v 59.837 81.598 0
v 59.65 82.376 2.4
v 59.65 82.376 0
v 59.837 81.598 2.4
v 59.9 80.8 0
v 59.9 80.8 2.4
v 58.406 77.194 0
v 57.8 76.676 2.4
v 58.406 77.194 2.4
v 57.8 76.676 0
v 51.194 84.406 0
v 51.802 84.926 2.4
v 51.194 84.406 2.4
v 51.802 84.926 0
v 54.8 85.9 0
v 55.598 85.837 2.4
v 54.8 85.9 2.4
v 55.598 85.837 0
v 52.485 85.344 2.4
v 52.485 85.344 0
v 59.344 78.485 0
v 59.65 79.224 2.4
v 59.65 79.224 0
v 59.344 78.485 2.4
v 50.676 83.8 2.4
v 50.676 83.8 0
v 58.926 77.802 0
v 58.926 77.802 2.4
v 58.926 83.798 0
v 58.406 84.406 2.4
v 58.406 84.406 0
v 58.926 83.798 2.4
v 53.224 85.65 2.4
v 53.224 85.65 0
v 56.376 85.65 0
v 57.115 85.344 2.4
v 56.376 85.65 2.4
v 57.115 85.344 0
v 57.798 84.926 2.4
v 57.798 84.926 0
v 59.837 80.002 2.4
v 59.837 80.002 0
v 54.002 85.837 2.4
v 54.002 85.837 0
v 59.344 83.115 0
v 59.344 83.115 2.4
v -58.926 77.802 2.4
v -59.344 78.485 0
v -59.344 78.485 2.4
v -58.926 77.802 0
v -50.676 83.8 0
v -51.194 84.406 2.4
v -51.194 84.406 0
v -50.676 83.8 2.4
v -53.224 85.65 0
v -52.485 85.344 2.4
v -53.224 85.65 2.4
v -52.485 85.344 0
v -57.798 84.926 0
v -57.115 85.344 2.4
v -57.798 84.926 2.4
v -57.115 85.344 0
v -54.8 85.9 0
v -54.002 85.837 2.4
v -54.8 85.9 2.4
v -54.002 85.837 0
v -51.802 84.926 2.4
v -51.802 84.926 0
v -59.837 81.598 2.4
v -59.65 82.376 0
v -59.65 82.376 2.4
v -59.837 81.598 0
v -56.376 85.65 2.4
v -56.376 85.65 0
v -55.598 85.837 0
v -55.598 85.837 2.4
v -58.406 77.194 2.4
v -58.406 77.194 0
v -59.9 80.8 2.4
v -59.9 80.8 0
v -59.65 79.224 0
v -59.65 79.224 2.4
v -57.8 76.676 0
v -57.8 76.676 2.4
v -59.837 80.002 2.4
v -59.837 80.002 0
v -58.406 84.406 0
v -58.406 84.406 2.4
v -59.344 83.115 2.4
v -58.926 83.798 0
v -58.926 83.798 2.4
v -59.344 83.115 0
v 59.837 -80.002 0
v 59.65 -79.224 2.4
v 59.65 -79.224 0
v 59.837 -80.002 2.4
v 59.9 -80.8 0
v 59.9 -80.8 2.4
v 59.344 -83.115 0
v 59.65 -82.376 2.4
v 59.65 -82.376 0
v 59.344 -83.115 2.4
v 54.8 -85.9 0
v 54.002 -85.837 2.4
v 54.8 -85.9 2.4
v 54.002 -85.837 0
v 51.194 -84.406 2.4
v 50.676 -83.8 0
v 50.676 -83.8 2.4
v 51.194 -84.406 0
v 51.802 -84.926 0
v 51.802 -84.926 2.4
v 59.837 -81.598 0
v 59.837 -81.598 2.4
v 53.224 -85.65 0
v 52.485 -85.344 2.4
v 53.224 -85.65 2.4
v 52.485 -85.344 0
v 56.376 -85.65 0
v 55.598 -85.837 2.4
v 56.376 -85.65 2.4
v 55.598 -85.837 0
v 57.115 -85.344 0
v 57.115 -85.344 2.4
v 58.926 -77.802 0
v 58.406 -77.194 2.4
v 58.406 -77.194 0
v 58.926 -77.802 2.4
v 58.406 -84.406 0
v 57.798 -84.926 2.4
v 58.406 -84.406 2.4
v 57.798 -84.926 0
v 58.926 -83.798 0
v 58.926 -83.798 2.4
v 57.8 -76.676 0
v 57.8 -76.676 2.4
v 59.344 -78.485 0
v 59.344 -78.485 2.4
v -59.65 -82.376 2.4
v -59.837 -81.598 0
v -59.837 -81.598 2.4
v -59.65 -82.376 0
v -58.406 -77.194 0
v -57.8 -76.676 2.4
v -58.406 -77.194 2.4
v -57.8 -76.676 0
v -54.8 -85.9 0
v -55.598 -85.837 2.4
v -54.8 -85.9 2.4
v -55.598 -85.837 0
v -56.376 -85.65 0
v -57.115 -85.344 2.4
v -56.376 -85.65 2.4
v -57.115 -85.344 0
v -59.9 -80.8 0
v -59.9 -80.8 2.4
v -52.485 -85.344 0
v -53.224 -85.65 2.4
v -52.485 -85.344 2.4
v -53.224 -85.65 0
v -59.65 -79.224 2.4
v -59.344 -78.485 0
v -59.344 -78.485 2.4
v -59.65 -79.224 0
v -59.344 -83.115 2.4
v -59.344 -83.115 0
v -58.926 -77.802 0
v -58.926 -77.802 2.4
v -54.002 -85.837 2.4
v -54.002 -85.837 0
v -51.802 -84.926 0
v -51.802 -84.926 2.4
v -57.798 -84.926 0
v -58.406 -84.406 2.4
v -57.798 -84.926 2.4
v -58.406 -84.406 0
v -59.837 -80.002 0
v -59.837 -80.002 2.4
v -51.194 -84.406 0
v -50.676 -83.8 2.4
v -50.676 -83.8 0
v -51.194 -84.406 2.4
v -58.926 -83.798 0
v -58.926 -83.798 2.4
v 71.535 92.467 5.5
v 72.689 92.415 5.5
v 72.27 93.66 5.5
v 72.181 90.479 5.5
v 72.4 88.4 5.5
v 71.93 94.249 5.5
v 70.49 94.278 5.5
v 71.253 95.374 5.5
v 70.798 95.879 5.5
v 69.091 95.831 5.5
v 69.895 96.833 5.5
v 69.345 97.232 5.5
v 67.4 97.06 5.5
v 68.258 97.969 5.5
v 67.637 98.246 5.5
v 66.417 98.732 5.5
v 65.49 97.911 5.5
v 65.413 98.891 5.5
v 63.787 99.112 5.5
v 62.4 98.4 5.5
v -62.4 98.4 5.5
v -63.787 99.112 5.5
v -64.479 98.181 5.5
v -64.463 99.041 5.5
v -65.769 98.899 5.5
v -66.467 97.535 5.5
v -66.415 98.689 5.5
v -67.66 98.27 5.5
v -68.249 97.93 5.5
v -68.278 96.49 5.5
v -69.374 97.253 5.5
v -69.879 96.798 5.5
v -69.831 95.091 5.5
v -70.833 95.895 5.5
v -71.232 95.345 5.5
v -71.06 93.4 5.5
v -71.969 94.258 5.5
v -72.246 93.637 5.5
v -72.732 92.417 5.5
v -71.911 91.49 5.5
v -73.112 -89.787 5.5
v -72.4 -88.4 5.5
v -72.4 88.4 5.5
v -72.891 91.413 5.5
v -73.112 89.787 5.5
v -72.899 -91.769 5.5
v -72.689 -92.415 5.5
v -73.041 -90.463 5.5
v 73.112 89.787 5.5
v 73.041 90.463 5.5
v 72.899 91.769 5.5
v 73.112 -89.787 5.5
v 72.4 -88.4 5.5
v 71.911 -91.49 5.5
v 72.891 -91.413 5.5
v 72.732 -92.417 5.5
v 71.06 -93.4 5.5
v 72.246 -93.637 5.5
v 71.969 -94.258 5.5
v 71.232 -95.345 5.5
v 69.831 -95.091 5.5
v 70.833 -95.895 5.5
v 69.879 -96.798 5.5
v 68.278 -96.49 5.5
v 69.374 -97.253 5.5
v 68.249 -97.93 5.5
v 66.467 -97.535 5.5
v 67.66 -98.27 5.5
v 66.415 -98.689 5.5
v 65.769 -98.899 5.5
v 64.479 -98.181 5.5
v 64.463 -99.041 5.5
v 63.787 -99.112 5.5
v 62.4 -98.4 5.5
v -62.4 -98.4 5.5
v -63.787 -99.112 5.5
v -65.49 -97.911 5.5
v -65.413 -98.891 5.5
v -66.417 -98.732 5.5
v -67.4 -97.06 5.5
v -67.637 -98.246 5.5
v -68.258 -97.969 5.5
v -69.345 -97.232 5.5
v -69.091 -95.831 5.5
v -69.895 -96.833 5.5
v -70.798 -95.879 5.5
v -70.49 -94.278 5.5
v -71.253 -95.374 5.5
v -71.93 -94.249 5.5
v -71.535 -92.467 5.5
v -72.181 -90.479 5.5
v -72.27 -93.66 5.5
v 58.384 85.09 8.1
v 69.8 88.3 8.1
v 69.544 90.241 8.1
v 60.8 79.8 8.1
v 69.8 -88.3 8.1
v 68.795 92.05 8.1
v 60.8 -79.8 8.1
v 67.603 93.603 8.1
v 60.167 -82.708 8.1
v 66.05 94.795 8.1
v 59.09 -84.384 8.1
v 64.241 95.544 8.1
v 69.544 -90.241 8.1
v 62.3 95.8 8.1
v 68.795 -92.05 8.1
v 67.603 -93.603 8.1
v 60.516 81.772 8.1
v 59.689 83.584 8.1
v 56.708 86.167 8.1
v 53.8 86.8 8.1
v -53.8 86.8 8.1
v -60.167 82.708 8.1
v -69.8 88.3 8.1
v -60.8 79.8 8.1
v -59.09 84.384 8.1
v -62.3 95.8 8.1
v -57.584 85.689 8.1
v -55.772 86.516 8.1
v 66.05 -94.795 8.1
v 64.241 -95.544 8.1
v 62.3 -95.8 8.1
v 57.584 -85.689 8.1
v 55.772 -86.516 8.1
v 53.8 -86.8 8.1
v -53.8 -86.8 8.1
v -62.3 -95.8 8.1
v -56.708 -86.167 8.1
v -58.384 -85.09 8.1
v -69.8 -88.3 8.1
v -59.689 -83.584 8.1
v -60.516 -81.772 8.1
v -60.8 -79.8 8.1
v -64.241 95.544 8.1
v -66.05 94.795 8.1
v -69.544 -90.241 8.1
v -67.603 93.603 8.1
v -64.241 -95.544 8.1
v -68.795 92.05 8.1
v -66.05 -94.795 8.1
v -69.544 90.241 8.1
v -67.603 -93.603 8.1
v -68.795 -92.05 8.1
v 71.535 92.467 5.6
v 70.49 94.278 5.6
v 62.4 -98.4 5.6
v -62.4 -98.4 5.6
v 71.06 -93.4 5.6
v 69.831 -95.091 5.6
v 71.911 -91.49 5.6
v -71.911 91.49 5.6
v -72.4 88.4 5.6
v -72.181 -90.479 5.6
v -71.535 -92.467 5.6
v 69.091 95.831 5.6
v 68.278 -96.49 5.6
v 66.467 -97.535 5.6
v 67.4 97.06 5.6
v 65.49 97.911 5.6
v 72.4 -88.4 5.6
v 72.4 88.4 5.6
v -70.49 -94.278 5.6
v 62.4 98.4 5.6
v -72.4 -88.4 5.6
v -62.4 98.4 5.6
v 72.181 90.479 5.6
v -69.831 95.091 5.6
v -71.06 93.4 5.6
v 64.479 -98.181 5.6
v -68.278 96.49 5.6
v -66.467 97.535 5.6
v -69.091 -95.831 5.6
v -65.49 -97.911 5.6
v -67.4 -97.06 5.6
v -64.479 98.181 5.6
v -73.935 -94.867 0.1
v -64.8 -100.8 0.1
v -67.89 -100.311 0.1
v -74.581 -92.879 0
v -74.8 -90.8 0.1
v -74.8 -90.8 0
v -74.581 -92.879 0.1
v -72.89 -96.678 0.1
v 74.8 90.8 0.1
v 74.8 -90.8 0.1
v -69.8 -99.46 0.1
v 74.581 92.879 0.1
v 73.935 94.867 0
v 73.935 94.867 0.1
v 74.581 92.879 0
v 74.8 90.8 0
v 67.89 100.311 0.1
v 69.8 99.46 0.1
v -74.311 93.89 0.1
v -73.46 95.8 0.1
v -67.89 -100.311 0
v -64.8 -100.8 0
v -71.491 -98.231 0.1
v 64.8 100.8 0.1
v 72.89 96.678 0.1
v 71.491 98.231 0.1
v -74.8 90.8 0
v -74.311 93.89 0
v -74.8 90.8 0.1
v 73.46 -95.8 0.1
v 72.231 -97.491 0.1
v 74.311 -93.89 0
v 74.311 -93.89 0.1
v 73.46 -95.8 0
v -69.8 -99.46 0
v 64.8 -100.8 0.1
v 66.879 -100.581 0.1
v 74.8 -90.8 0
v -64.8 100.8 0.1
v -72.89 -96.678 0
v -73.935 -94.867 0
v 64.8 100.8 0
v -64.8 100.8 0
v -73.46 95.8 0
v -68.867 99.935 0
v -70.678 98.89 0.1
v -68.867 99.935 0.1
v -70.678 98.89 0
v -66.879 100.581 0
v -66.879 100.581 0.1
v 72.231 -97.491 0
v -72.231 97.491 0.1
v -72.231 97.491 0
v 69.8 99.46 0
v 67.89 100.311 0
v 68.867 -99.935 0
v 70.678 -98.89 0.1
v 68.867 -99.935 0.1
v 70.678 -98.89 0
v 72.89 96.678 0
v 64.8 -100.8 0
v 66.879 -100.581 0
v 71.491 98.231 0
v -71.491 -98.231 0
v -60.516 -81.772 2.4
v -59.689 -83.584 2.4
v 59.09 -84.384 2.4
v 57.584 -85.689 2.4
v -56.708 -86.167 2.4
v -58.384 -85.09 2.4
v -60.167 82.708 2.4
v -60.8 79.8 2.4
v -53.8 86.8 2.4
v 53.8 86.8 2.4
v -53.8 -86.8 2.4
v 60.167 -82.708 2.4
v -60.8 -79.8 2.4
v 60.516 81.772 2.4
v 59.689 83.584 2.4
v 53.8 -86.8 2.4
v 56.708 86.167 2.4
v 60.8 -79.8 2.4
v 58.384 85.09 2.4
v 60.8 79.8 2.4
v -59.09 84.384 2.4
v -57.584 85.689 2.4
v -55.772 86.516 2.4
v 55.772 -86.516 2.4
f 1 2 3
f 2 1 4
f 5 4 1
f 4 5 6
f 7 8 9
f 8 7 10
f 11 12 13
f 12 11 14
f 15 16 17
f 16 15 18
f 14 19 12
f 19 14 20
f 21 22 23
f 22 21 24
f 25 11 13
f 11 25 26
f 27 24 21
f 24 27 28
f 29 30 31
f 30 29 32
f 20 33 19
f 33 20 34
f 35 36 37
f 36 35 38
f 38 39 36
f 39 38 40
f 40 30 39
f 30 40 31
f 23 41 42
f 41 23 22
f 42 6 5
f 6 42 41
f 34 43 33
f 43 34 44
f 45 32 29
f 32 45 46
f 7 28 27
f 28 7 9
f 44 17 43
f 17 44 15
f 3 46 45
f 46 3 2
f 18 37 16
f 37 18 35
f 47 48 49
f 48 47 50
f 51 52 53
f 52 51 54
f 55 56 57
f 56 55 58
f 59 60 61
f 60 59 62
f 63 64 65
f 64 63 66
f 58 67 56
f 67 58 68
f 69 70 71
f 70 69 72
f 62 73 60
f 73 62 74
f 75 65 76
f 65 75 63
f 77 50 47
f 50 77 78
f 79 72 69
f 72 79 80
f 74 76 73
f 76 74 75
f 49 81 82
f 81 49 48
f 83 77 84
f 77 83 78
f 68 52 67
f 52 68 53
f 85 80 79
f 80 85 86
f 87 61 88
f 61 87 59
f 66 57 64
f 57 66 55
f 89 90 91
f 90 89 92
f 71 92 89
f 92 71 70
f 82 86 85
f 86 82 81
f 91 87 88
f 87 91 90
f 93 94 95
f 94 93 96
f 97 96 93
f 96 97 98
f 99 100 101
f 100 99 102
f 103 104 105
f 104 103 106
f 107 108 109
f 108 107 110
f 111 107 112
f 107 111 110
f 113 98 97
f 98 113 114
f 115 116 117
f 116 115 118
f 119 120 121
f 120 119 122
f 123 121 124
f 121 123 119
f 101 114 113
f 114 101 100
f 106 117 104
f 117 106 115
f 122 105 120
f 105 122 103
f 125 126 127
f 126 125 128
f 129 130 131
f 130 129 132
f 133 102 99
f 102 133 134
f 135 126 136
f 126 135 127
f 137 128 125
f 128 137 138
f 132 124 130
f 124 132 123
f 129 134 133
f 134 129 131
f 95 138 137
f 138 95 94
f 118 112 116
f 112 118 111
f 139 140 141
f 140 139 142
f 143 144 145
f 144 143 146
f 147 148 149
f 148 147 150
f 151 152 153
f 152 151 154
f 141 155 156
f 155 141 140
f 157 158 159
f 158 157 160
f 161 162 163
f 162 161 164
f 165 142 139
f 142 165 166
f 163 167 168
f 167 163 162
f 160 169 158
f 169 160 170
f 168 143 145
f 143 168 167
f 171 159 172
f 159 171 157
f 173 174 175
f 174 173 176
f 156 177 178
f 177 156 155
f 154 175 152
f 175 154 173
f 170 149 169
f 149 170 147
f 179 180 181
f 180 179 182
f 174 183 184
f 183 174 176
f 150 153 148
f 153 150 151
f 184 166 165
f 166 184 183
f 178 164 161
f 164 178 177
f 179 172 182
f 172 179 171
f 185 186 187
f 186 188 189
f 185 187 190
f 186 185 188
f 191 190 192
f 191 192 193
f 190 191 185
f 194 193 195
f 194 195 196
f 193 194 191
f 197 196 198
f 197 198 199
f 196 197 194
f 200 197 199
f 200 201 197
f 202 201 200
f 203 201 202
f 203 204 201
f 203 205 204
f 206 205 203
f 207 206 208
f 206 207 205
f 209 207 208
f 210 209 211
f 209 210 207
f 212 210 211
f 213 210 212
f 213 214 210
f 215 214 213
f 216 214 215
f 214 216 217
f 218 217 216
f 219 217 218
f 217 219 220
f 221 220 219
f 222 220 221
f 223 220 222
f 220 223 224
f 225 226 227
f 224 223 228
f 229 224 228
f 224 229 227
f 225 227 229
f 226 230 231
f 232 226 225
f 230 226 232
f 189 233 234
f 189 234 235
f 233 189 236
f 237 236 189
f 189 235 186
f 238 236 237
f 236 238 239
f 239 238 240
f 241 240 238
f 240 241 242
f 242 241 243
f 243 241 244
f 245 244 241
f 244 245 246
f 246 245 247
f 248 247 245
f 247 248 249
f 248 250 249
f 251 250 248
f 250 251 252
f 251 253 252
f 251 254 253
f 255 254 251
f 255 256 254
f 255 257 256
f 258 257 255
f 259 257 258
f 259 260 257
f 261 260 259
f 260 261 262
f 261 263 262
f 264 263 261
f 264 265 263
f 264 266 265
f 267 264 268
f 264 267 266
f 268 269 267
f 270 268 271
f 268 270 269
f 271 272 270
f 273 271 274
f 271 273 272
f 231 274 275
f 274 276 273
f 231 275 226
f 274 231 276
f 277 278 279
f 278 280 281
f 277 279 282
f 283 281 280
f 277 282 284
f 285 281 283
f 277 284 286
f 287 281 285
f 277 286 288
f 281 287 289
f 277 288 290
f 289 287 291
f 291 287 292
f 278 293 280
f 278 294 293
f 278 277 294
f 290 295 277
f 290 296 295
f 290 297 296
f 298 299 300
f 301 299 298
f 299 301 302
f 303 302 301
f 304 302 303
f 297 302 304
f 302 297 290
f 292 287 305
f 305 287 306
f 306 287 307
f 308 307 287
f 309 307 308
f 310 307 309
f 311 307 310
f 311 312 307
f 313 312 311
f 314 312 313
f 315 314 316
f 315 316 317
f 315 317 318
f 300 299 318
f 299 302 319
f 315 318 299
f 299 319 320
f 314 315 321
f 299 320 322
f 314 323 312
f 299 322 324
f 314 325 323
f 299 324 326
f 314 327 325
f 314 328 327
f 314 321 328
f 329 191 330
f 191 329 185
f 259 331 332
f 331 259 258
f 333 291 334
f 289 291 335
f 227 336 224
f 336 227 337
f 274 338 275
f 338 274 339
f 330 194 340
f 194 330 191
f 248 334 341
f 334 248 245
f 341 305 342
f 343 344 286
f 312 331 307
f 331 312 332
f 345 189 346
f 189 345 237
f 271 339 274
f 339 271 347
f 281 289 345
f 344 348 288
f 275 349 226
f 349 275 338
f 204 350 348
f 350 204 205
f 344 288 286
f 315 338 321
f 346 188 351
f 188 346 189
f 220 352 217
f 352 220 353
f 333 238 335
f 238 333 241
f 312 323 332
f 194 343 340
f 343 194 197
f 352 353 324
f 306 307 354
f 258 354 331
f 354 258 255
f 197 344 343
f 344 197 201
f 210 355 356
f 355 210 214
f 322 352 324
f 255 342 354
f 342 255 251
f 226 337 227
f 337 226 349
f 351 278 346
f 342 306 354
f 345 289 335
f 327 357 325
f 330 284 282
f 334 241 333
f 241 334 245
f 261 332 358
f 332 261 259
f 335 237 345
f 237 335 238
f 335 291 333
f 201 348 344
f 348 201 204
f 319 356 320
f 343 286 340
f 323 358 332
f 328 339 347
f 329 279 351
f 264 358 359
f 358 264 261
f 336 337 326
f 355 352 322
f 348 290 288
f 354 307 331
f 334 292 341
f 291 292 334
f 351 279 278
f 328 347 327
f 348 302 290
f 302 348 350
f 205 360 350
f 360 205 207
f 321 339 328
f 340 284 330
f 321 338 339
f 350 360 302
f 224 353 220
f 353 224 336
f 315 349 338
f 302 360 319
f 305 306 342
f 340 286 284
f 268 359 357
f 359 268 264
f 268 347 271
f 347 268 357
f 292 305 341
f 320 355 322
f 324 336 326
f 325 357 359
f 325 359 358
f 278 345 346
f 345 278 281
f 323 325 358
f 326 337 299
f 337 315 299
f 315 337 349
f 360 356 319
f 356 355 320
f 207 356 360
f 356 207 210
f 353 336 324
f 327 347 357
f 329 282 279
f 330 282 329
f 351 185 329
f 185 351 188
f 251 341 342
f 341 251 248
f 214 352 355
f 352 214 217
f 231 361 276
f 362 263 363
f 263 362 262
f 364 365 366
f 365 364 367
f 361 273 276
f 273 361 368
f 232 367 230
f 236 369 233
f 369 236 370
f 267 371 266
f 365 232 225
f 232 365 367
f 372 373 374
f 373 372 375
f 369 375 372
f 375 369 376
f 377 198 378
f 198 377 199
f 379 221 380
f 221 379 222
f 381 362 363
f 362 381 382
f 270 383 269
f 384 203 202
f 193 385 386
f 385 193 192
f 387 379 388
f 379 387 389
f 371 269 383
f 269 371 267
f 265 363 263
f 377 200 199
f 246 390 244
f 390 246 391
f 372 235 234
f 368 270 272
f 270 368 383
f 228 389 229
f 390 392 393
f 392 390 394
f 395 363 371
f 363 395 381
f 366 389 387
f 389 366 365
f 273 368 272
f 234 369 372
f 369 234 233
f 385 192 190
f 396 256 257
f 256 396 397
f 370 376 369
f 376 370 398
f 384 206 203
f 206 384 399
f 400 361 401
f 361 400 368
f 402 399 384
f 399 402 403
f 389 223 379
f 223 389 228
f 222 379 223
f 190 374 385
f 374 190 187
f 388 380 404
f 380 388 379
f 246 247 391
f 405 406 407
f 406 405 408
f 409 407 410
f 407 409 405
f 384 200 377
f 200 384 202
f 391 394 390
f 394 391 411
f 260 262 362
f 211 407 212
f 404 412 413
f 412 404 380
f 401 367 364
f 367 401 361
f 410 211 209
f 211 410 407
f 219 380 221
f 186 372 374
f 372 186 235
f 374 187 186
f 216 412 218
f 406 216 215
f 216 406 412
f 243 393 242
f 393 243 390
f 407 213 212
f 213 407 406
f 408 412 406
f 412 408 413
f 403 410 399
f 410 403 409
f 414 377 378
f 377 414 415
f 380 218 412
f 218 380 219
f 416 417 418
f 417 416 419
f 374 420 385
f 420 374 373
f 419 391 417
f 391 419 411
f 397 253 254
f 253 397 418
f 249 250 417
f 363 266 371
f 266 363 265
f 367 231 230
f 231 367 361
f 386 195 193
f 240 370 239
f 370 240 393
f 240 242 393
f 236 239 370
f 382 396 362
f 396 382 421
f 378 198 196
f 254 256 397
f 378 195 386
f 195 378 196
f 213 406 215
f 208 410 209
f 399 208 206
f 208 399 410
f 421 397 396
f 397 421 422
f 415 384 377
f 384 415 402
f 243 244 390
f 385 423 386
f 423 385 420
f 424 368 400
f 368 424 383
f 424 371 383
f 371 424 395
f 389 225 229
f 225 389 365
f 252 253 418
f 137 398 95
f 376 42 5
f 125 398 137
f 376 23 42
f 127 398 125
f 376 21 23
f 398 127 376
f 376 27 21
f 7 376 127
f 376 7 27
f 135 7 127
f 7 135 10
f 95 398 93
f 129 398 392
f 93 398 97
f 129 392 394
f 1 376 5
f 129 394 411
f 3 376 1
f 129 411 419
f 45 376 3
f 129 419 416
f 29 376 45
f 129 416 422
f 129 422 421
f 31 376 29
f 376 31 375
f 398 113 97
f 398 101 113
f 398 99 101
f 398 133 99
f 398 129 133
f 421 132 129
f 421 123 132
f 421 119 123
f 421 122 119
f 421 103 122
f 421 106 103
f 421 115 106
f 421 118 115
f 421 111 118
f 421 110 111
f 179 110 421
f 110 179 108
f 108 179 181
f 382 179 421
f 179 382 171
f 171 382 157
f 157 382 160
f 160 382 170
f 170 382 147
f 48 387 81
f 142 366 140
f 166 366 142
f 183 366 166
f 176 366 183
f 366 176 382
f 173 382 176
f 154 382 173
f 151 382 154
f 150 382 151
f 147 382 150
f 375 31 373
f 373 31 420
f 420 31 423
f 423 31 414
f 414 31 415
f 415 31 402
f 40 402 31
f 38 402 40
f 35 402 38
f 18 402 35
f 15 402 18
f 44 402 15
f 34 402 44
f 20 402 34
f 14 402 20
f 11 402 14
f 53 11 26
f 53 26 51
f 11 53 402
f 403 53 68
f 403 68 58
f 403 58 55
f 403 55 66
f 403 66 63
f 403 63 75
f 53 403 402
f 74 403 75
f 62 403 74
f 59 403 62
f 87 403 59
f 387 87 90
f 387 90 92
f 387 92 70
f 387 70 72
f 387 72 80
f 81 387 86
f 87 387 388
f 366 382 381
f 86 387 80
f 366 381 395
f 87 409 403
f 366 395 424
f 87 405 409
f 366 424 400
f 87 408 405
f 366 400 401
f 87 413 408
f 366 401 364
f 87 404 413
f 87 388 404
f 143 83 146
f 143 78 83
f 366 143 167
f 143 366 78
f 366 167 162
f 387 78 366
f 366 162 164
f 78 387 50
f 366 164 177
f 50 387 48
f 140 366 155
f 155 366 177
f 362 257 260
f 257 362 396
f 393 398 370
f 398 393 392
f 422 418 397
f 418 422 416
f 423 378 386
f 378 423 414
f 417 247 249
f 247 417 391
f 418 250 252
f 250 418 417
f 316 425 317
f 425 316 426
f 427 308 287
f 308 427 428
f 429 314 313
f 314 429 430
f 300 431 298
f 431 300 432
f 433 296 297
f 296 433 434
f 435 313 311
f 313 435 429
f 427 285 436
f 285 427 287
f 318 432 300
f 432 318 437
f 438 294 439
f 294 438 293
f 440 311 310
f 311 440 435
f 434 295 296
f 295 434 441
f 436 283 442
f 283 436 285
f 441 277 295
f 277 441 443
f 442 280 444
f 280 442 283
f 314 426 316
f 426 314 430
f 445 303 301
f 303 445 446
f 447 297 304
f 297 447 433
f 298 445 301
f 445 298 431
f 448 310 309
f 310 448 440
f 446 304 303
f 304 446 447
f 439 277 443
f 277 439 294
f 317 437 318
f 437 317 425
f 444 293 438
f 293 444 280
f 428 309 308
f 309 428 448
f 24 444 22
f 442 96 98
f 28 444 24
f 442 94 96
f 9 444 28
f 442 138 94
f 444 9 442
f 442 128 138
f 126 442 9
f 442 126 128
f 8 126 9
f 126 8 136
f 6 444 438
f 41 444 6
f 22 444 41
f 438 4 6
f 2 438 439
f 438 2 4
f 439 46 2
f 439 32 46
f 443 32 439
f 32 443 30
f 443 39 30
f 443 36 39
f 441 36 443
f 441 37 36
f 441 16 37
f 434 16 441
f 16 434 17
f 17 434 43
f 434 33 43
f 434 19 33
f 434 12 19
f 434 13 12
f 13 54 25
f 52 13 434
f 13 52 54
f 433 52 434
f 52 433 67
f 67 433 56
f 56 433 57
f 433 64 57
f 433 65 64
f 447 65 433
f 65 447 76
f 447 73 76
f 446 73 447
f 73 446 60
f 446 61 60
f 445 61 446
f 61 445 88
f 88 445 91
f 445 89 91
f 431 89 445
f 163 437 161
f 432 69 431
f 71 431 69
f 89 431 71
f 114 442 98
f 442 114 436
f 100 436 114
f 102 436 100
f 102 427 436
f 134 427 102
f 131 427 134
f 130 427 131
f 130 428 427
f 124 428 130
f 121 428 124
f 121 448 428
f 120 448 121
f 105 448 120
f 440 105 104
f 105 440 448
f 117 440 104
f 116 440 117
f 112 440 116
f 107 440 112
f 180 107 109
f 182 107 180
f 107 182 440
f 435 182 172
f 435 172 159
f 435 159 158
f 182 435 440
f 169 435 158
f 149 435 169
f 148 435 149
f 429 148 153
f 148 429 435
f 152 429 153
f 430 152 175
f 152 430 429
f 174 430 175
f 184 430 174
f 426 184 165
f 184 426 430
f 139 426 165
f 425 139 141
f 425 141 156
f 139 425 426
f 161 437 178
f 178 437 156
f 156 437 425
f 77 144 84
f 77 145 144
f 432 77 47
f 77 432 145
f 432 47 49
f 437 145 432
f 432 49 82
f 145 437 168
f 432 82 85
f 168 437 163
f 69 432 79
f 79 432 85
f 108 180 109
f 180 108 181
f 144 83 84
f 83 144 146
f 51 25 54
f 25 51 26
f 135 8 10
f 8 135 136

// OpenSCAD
// ============================================================
// Kindle Touch 4th Gen — Magnetic Picture Frame Mount
// ============================================================
// Warm, crafted-feeling wall mount. Magnets on the back attach
// to any metal surface. Holds Kindle in portrait OR landscape.
//
// Designed to embrace 3D printing — wider borders, soft edges,
// and a tapered profile that looks intentional with layer lines.
//
// Print settings:
//   - Layer height: 0.2mm
//   - Infill: 20-30%
//   - No supports needed
//   - Print face-down (back plate on bed)
//   - Wood PLA looks great, matte PLA also works well
// ============================================================

// --- PARAMETERS ---

// Kindle Touch 4th Gen
kindle_width  = 120;    // mm (short side)
kindle_height = 172;    // mm (long side)
kindle_depth  = 10.1;   // mm (thickness)

// Tolerance
tolerance = 0.8;        // mm per side

// Frame — wider border for a warm picture-frame feel
frame_border   = 14;    // mm visible frame around kindle
frame_depth    = 8;     // mm total thickness at the base
back_wall      = 2.4;   // mm back plate
lip_width      = 3;     // mm lip overhang to hold kindle

// Front taper — frame gets thinner toward the screen opening
// Creates a gentle bevel that catches light nicely
front_taper    = 2.5;   // mm thinner at the front than at the back edge

// Kindle pocket
pocket_w = kindle_width  + tolerance * 2;
pocket_h = kindle_height + tolerance * 2;

// Overall frame size
frame_w = pocket_w + frame_border * 2;
frame_h = pocket_h + frame_border * 2;

// Soft rounded corners
corner_radius = 10;     // mm — generous for warmth

// Magnets (10mm x 3mm neodymium discs)
magnet_diameter = 10.2;
magnet_depth    = 3.2;
magnet_inset    = 20;   // mm from corner

// Front chamfer on outer edge
chamfer_size = 2.5;     // mm — softens the front face edge

// --- MODULES ---

module rounded_rect(w, h, r) {
    offset(r = r)
        offset(r = -r)
            square([w, h], center = true);
}

module tapered_frame_body() {
    // The frame tapers from full depth at the outer edge
    // to (frame_depth - front_taper) at the pocket edge.
    // This creates a subtle slope on the front face.

    hull() {
        // Back face — full size
        linear_extrude(0.1)
            rounded_rect(frame_w, frame_h, corner_radius);

        // Front face — slightly smaller (creates the taper)
        translate([0, 0, frame_depth])
            linear_extrude(0.1)
                rounded_rect(frame_w - front_taper * 2, frame_h - front_taper * 2, corner_radius - 1);
    }
}

module front_chamfer() {
    // Chamfer the front outer edge for a softer feel
    translate([0, 0, frame_depth - chamfer_size])
        difference() {
            translate([0, 0, 0])
                linear_extrude(chamfer_size + 0.1)
                    rounded_rect(frame_w + 1, frame_h + 1, corner_radius);

            // The chamfer shape — angled cut
            hull() {
                linear_extrude(0.1)
                    rounded_rect(frame_w - front_taper * 2 + 0.2, frame_h - front_taper * 2 + 0.2, corner_radius);
                translate([0, 0, chamfer_size])
                    linear_extrude(0.1)
                        rounded_rect(frame_w - front_taper * 2 - chamfer_size * 2, frame_h - front_taper * 2 - chamfer_size * 2, max(1, corner_radius - chamfer_size));
            }
        }
}

module frame() {
    difference() {
        // Main body with taper
        tapered_frame_body();

        // Kindle pocket — carved from the front
        translate([0, 0, back_wall])
            linear_extrude(frame_depth)
                rounded_rect(pocket_w, pocket_h, max(2, corner_radius - 3));

        // Screen opening through the full frame (the lip is what remains)
        inner_w = pocket_w - lip_width * 2;
        inner_h = pocket_h - lip_width * 2;
        translate([0, 0, -0.1])
            linear_extrude(frame_depth + 1)
                rounded_rect(inner_w, inner_h, max(1, corner_radius - 4));

        // Magnet recesses in the back
        for (pos = magnet_positions()) {
            translate([pos[0], pos[1], -0.1])
                cylinder(d = magnet_diameter, h = magnet_depth + 0.1, $fn = 40);
        }

        // Chamfer the front outer edge
        front_chamfer();
    }
}

function magnet_positions() = [
    [ frame_w/2 - magnet_inset,  frame_h/2 - magnet_inset, 0],
    [-frame_w/2 + magnet_inset,  frame_h/2 - magnet_inset, 0],
    [ frame_w/2 - magnet_inset, -frame_h/2 + magnet_inset, 0],
    [-frame_w/2 + magnet_inset, -frame_h/2 + magnet_inset, 0],
];

// --- RENDER ---

frame();

// --- INFO ---
echo(str("Frame: ", frame_w, " x ", frame_h, " x ", frame_depth, " mm"));
echo(str("Pocket: ", pocket_w, " x ", pocket_h, " mm"));
echo(str("Border width: ", frame_border, " mm"));
echo(str("Magnets: 10x3mm neodymium disc x 4"));
echo(str("Corner radius: ", corner_radius, " mm"));
echo(str("Front taper: ", front_taper, " mm"));
